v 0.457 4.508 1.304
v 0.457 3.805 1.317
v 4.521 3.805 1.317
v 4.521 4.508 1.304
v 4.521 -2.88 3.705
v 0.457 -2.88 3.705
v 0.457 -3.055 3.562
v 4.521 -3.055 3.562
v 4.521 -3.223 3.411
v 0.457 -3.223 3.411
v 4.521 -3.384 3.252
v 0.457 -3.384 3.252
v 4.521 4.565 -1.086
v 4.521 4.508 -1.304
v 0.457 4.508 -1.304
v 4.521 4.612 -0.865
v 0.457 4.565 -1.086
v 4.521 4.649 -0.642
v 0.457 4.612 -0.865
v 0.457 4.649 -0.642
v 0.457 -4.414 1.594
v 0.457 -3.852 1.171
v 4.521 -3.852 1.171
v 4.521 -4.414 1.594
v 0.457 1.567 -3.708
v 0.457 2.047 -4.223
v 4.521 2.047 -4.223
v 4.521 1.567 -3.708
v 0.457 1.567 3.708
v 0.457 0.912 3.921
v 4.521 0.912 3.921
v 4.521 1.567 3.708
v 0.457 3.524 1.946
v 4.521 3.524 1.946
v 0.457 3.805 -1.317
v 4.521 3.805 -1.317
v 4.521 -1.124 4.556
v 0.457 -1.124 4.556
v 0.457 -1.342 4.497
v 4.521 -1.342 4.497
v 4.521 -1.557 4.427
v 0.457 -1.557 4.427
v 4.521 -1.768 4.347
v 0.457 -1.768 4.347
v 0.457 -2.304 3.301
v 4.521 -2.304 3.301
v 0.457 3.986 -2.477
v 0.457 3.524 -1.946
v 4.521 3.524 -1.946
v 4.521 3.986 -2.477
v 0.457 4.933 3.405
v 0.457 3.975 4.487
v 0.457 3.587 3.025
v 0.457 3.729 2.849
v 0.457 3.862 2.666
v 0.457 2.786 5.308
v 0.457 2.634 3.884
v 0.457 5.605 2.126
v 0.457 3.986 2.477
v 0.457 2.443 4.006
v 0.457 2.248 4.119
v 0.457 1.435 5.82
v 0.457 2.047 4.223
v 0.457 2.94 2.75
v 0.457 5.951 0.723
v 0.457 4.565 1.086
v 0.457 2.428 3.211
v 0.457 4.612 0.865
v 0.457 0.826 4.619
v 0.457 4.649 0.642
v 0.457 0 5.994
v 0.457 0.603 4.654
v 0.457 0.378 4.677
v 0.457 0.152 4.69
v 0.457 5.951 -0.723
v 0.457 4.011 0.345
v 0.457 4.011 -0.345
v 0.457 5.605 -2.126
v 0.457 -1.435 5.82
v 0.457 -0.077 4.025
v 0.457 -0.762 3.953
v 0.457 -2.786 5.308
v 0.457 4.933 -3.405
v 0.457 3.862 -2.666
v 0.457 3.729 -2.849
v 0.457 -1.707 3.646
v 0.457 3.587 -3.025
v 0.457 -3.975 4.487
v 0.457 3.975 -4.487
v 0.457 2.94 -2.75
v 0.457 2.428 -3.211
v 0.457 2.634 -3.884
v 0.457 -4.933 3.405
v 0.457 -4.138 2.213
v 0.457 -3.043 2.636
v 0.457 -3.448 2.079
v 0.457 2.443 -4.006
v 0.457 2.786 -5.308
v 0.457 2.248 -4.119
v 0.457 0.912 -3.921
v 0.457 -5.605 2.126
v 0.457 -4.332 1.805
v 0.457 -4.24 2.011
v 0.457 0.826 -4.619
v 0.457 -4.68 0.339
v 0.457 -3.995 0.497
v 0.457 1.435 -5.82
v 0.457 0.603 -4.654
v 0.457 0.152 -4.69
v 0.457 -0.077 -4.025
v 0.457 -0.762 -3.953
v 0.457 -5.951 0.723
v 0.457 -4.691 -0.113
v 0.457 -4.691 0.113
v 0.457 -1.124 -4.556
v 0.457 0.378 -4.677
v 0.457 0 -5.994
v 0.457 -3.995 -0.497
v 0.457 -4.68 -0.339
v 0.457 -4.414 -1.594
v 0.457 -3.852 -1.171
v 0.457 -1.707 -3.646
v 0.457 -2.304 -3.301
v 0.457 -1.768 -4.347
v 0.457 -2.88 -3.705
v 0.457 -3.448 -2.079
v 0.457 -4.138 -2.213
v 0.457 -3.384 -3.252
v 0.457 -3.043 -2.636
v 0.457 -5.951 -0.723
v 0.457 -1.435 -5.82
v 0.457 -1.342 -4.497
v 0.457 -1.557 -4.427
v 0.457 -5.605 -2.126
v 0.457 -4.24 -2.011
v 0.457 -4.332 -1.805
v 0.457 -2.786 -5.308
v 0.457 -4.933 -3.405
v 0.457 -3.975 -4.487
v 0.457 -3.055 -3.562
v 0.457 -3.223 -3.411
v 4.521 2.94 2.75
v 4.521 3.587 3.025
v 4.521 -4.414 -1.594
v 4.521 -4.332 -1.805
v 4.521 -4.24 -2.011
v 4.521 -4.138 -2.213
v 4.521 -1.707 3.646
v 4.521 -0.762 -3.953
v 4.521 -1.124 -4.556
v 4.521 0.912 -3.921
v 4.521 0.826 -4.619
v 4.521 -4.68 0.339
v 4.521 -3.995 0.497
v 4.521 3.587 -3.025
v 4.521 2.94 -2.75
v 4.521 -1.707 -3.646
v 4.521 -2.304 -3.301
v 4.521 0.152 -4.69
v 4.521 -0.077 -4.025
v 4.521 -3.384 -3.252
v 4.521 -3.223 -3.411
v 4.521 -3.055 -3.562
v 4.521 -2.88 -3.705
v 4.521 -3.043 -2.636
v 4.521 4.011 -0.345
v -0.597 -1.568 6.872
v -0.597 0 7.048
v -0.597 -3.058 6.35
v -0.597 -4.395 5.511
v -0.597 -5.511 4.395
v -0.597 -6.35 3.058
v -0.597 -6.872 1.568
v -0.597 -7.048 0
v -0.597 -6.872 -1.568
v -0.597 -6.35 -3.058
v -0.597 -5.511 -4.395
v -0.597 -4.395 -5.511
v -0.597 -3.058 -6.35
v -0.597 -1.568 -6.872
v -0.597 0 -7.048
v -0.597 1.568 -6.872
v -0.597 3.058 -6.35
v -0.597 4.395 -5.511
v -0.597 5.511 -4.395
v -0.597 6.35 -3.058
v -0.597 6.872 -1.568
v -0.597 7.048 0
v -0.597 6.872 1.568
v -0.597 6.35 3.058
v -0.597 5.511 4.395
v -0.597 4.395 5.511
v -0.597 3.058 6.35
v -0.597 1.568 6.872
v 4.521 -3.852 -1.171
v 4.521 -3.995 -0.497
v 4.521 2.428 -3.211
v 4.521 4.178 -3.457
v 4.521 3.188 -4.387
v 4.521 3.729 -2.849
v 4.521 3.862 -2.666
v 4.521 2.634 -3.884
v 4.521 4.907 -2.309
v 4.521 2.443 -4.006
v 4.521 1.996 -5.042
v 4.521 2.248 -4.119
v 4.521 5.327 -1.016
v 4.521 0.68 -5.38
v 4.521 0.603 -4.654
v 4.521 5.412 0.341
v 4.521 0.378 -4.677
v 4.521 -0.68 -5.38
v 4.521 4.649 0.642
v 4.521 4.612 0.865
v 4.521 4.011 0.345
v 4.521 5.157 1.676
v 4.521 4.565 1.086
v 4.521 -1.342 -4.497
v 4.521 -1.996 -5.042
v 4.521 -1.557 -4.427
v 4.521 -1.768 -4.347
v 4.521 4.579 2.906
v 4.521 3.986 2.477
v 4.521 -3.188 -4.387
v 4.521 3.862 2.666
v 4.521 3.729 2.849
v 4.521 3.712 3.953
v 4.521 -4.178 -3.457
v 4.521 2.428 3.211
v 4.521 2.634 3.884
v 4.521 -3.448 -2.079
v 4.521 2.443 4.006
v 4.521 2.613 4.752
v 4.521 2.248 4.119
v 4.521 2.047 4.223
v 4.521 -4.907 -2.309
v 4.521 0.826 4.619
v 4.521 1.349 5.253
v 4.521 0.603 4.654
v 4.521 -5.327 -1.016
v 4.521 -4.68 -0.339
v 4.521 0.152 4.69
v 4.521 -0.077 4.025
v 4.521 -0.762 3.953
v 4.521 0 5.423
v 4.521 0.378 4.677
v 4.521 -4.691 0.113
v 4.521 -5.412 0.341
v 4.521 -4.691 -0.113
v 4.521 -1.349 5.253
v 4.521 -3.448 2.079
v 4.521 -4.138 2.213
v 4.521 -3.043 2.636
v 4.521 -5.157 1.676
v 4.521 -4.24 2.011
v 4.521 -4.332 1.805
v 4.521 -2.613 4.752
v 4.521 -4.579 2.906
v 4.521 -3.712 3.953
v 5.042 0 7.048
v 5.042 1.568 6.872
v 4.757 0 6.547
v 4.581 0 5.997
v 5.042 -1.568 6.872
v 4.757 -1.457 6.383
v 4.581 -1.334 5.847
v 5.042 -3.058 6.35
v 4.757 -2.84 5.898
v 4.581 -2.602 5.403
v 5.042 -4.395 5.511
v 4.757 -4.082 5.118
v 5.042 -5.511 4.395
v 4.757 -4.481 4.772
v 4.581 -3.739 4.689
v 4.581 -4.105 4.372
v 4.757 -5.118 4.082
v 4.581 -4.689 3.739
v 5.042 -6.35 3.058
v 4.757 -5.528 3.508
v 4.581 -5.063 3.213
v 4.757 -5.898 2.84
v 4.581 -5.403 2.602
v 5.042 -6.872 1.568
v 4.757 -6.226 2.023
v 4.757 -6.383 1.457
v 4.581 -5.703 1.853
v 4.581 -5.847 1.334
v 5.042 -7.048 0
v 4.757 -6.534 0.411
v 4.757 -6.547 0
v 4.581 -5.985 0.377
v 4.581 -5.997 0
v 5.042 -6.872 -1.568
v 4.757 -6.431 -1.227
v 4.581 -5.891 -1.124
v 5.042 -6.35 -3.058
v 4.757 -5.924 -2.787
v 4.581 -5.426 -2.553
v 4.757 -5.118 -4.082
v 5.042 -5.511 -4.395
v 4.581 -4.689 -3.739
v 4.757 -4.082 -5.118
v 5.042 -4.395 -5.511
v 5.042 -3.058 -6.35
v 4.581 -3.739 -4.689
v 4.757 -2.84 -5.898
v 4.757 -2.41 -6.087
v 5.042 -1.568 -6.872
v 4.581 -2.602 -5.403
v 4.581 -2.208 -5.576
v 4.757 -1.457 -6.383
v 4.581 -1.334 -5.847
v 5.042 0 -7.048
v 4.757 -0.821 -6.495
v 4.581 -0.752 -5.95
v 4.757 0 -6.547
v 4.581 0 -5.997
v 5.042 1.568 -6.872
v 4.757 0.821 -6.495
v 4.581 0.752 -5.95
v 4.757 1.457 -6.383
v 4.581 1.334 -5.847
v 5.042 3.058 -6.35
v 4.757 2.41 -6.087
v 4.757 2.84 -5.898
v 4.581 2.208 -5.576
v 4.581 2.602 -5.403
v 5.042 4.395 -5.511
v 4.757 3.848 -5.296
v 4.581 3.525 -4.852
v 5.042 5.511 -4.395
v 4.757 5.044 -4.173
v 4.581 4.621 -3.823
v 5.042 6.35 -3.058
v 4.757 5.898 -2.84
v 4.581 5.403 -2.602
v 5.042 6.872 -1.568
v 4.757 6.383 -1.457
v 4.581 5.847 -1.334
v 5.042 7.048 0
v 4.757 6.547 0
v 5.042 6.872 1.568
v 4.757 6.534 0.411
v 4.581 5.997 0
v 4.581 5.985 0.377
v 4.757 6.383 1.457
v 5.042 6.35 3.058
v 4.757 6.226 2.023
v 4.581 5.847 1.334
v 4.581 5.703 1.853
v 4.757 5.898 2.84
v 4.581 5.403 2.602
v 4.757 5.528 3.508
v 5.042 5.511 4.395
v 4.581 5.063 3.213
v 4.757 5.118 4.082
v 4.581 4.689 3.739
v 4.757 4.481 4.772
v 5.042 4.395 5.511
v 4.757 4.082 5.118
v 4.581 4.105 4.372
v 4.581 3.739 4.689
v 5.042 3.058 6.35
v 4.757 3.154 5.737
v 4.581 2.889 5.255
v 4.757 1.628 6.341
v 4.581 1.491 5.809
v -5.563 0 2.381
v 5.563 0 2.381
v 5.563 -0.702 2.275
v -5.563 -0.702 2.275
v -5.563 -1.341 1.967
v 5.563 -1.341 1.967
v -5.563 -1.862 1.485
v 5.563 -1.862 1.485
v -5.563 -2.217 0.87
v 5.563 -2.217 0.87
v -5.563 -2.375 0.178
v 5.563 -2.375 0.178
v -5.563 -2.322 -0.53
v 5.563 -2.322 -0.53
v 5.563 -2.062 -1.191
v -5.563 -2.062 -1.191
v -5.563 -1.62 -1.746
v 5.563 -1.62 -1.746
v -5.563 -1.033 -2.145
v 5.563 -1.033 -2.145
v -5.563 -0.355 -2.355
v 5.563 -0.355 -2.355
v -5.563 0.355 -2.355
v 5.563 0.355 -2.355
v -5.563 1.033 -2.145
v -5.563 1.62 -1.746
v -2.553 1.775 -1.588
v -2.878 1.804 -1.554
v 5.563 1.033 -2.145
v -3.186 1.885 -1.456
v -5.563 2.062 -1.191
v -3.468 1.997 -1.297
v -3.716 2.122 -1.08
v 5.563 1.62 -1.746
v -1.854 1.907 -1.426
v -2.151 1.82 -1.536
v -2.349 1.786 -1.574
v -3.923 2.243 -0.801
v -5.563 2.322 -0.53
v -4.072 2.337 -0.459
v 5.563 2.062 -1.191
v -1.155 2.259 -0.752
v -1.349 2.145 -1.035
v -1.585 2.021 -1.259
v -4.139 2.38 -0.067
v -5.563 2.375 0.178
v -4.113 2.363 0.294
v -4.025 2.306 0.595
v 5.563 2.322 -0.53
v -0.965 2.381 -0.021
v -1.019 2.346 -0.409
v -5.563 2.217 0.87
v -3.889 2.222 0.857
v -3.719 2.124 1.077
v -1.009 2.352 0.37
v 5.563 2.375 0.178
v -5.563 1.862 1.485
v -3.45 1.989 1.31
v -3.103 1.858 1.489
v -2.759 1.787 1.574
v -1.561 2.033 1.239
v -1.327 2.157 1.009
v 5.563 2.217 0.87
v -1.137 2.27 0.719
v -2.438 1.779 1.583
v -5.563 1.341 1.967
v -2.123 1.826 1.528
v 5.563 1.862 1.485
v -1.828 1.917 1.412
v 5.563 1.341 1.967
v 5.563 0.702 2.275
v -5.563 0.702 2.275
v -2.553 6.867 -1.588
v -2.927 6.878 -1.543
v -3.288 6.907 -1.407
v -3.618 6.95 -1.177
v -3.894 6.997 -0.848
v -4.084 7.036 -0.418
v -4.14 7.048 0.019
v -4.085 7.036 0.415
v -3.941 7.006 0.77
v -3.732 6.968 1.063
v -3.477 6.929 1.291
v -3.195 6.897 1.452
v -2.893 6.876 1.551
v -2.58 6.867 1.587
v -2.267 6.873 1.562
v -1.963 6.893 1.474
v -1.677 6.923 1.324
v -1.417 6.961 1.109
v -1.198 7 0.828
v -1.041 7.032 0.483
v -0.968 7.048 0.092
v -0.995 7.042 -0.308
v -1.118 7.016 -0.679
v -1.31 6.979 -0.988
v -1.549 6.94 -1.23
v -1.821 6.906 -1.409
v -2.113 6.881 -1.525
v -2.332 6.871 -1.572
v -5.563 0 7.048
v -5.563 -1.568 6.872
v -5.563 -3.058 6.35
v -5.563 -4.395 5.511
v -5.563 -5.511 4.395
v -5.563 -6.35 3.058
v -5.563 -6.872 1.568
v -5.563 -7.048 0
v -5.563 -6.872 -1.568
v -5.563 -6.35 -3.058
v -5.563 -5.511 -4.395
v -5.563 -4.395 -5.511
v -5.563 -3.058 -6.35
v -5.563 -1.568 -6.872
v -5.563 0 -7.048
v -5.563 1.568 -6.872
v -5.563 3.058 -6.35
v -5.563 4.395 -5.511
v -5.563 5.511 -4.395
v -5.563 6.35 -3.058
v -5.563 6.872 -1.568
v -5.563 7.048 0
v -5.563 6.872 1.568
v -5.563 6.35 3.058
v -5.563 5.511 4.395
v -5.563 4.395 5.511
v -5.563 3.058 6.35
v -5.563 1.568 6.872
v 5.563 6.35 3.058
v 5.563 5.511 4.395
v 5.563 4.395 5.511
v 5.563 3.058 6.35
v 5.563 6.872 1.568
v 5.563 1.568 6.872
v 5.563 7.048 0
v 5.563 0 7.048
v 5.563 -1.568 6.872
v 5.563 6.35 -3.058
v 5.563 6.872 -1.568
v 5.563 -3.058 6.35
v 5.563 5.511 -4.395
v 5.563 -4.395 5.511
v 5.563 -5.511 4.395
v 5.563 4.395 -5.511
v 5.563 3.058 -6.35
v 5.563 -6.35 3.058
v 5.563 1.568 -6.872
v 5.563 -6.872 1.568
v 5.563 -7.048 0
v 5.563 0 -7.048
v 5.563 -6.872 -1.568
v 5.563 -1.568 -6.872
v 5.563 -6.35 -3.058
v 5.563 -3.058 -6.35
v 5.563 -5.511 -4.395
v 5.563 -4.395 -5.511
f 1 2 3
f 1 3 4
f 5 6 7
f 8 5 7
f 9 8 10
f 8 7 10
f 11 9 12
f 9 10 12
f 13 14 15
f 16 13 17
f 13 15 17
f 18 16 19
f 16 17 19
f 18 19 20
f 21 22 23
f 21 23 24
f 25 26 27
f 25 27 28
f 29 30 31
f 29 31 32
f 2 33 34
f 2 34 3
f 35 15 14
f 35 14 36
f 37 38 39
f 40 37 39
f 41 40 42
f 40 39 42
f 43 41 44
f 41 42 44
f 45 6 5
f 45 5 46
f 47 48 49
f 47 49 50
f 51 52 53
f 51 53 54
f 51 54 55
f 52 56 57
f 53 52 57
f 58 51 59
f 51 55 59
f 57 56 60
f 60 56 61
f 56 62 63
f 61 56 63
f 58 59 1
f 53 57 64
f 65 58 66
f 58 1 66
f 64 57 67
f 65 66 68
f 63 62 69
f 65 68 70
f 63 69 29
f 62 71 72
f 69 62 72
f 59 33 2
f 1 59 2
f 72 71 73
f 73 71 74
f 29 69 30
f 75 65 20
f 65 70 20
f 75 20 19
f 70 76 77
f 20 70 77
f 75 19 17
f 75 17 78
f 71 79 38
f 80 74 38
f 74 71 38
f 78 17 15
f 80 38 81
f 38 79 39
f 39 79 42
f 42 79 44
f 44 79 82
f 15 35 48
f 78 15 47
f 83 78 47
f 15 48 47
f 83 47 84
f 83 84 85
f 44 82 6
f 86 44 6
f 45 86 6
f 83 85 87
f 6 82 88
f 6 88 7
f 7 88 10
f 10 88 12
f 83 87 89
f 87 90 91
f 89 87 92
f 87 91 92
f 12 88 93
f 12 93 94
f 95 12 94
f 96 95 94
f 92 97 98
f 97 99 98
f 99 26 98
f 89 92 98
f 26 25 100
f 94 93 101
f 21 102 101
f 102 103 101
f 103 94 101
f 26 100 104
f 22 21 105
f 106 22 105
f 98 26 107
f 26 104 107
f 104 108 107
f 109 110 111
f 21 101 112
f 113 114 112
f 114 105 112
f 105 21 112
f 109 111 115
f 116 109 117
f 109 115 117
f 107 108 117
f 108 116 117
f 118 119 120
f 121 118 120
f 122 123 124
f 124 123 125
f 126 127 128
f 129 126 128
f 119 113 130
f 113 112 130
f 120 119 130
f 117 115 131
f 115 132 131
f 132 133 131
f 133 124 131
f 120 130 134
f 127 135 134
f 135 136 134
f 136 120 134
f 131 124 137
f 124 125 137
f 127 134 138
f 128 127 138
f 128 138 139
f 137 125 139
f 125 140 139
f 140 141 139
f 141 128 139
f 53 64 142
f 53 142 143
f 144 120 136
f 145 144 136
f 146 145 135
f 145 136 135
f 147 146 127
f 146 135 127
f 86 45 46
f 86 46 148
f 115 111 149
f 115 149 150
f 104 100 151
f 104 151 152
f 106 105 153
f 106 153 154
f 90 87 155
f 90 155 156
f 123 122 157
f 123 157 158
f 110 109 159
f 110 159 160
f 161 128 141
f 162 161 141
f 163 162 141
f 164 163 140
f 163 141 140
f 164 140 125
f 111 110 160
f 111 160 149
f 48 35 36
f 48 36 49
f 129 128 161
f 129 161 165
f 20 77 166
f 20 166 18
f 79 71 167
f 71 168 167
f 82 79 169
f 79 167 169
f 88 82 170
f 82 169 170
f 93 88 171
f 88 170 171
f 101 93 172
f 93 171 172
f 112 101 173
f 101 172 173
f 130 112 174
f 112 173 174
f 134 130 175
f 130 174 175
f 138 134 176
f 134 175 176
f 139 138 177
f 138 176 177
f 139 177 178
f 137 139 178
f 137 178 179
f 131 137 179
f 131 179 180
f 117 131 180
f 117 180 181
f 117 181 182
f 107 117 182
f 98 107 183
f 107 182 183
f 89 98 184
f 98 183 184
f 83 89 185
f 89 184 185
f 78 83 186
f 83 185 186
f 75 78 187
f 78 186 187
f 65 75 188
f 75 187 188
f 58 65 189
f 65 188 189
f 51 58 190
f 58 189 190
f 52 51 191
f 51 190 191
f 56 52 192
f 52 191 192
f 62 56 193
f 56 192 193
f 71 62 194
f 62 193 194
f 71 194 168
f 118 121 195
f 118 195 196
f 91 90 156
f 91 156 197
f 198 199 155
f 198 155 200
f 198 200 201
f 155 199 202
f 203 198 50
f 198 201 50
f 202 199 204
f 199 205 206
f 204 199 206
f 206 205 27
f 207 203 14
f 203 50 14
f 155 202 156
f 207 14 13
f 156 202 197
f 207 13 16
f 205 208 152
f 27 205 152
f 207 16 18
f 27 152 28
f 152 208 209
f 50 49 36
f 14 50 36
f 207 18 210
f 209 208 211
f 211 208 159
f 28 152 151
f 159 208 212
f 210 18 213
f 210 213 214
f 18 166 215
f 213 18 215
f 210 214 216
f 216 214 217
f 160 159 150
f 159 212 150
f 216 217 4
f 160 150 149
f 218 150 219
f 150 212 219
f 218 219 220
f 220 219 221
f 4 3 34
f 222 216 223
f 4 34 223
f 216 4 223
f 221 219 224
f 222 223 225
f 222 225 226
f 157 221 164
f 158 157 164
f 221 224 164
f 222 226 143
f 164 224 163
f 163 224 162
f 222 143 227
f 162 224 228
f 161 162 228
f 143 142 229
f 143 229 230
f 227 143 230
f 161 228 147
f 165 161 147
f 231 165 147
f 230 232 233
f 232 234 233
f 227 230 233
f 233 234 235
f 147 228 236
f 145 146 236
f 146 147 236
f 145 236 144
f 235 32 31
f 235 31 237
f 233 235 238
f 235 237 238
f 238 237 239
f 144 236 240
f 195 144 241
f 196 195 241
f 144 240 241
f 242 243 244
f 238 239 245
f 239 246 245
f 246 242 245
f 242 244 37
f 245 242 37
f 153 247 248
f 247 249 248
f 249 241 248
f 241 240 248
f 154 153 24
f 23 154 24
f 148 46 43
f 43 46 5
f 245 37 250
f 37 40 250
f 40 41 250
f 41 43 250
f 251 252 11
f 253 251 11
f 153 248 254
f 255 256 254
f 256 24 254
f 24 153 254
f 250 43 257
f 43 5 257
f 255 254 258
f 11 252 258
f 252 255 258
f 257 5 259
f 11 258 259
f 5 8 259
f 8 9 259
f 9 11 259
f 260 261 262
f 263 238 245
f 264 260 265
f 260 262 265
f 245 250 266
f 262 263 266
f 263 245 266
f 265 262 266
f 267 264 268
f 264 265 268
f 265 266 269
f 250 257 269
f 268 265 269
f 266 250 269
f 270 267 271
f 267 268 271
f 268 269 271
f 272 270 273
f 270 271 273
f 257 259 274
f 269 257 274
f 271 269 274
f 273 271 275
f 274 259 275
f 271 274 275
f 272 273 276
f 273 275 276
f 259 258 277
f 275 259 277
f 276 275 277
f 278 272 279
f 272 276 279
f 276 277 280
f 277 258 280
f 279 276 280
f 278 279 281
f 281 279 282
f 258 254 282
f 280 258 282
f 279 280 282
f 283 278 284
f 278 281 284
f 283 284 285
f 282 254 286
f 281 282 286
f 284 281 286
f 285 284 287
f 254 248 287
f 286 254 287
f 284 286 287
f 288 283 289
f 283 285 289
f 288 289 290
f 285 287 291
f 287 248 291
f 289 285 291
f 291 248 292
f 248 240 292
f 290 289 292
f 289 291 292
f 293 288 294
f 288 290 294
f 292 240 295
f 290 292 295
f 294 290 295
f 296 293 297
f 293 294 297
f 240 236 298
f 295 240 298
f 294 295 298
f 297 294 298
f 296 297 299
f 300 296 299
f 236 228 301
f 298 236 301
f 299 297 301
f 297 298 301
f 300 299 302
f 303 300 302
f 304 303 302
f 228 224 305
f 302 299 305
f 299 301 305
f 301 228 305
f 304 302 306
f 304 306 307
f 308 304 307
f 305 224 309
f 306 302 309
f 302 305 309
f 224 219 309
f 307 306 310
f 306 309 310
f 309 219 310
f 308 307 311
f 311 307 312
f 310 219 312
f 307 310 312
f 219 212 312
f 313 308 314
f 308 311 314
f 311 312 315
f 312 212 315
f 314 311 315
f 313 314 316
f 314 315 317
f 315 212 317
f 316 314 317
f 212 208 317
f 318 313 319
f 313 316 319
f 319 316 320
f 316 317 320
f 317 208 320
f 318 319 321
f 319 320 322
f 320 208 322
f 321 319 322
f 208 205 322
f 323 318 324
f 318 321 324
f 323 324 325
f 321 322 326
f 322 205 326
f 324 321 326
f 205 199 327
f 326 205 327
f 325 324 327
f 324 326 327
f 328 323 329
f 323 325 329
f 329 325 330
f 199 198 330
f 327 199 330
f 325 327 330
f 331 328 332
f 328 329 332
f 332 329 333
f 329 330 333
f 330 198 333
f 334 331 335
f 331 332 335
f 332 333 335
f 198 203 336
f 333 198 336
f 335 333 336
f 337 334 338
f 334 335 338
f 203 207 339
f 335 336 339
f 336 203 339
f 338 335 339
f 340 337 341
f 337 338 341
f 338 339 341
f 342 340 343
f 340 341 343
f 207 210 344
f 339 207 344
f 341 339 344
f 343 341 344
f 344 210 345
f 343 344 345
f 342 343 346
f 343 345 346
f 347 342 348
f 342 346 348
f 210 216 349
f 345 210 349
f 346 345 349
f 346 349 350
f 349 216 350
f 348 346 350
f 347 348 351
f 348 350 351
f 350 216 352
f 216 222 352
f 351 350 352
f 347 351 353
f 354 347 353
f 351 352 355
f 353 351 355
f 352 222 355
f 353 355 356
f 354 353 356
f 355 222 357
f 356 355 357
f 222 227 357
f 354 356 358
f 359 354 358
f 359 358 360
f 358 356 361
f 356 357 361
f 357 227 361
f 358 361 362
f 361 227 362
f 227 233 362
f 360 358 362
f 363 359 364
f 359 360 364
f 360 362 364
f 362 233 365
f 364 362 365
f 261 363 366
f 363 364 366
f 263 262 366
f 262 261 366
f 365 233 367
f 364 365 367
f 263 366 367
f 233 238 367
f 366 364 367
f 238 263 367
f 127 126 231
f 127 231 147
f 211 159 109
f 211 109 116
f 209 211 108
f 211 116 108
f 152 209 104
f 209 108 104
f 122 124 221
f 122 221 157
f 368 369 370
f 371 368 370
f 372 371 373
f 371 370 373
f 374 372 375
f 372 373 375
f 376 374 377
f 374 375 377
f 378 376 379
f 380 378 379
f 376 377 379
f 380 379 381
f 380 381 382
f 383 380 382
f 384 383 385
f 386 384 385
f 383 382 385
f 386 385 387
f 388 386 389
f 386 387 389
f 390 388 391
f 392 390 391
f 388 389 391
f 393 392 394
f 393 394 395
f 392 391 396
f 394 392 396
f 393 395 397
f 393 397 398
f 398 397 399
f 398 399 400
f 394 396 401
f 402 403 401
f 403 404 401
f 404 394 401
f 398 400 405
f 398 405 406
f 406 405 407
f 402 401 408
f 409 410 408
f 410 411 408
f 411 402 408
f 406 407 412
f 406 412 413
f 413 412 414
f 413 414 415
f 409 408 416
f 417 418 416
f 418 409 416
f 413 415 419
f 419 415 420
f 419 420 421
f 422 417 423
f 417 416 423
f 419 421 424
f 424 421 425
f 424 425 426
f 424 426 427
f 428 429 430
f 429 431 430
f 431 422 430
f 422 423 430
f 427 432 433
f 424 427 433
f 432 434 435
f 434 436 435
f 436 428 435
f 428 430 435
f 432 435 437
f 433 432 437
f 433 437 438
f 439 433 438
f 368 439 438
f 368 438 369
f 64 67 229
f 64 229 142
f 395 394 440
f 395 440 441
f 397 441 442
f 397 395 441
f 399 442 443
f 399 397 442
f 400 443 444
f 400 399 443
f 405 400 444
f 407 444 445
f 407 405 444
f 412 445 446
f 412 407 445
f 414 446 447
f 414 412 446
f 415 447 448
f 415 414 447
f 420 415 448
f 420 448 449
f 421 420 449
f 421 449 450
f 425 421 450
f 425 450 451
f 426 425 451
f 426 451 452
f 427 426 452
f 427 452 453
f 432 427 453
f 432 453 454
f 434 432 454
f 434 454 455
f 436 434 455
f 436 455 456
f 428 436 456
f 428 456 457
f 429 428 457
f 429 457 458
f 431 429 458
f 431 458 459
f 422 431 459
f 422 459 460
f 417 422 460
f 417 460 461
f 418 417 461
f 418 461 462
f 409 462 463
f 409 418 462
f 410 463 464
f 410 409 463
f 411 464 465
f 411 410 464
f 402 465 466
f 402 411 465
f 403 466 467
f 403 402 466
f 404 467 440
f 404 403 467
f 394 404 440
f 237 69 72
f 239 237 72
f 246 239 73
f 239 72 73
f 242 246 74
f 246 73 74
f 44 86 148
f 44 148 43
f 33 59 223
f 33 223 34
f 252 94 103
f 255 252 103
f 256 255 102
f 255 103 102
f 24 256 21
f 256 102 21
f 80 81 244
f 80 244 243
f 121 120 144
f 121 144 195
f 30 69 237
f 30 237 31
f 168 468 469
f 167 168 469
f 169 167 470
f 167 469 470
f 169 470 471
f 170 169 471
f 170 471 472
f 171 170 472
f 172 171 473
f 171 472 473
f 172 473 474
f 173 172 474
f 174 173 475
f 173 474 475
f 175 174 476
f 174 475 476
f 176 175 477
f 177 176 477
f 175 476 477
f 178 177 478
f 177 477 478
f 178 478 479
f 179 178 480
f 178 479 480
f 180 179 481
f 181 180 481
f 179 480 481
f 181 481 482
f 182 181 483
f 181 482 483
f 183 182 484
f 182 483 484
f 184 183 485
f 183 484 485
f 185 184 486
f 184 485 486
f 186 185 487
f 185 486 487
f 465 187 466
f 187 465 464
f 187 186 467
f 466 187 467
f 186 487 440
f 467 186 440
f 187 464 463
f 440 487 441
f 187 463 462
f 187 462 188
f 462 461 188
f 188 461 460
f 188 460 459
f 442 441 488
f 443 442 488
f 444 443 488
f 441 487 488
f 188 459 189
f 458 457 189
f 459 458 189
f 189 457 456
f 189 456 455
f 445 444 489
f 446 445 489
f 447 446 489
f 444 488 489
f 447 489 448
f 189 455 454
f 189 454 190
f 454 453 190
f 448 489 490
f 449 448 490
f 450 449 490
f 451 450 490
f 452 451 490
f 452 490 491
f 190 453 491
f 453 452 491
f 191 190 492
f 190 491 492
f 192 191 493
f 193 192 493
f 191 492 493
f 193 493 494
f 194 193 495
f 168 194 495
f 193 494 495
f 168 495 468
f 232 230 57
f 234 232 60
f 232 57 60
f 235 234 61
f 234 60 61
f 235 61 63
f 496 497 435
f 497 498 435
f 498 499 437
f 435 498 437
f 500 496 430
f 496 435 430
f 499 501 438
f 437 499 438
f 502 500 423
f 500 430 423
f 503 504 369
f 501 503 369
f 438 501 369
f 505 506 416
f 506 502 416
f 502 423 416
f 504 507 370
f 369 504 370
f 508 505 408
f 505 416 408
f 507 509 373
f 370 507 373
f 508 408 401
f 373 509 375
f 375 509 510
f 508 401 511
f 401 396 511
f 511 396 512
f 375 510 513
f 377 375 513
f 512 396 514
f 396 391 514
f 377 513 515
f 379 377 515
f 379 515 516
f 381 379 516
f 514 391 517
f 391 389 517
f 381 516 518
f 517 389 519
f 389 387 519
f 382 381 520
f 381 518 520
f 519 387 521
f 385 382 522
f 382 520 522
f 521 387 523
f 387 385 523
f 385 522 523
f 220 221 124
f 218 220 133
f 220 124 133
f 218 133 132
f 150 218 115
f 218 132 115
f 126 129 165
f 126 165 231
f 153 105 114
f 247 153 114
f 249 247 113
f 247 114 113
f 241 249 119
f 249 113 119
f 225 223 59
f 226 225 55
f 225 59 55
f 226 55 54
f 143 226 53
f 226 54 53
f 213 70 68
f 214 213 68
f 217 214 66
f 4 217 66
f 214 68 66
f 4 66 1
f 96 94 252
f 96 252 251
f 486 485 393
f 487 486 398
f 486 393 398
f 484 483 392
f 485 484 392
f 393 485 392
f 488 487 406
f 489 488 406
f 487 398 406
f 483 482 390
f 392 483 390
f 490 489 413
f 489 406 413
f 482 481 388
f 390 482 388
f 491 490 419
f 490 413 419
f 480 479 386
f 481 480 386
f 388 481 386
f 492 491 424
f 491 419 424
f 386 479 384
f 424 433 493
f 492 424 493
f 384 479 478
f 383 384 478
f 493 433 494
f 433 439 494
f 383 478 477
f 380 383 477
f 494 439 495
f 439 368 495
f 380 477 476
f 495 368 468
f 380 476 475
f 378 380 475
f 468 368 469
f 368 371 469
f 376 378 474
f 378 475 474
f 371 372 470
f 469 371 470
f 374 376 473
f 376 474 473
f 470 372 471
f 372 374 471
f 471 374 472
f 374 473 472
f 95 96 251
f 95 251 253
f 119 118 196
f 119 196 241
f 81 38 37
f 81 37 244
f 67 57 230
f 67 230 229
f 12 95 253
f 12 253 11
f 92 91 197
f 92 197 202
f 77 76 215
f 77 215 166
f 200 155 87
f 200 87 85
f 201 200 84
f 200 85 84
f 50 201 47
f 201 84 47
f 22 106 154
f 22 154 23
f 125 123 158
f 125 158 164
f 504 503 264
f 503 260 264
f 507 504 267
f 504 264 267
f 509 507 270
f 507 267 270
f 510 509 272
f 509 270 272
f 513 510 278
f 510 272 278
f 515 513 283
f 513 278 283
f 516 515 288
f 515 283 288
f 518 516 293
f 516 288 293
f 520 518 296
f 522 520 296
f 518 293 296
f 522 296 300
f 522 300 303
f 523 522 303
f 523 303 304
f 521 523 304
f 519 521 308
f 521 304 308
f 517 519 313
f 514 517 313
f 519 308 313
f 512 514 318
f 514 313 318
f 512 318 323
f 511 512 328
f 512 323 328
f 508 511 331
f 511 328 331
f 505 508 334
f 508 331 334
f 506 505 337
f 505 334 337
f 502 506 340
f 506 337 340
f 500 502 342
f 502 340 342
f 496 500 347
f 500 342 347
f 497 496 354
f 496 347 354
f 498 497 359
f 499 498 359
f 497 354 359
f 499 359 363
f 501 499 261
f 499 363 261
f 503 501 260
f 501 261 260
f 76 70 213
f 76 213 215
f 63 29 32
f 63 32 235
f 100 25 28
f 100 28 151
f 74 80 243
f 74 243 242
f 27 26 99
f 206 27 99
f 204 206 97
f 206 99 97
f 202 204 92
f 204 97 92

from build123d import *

# Parameters (mm, degrees)
SKETCH4_R          = 4.8514
SKETCH4_R_2        = 4.69265
CUT_EXTRUDE2_DEPTH = 4.064
CUT_EXTRUDE1_DEPTH = 4.064
CIRPATTERN1_COUNT  = 15
SKETCH6_R          = 1.5875
CUT_EXTRUDE3_DEPTH = 12.415131329


with BuildPart() as part:
    # Sketch1 → Revolve1 (revolve)
    with BuildSketch(Plane.XY, mode=Mode.PRIVATE) as revolve1_sk:
        with BuildLine():
            Line((-5.5626, 2.38125), (5.5626, 2.38125))
            Line((5.5626, 2.38125), (5.5626, 7.0485))
            Line((5.5626, 7.0485), (5.0419, 7.0485))
            ThreePointArc((5.0419, 7.0485), (4.654552953, 6.276378742), (4.5212, 5.4229))
            Line((4.5212, 5.4229), (4.5212, 4.8514))
            Line((4.5212, 4.8514), (0.4572, 4.8514))
            Line((0.4572, 4.8514), (0.4572, 5.9944))
            Line((0.4572, 5.9944), (-0.5969, 7.0485))
            Line((-0.5969, 7.0485), (-5.5626, 7.0485))
            Line((-5.5626, 7.0485), (-5.5626, 2.38125))
        make_face()
    revolve(revolve1_sk.sketch.rotate(Axis((-5.5626, 0, 0), (1, 0, 0)), 90), axis=Axis((-5.5626, 0, 0), (1, 0, 0)))

    # Sketch4 → Cut-Extrude2 (cut)
    with BuildSketch(Plane(origin=(0.4572, 0, 0), x_dir=(0, 0, -1), z_dir=(1, 0, 0))):
        Circle(SKETCH4_R)
        Circle(SKETCH4_R_2, mode=Mode.SUBTRACT)
    extrude(amount=CUT_EXTRUDE2_DEPTH, mode=Mode.SUBTRACT)

    # Sketch3 → Cut-Extrude1 (cut)
    with BuildSketch(Plane(origin=(0.4572, 0, 0), x_dir=(0, 0, -1), z_dir=(1, 0, 0))):
        with BuildLine():
            Line((-0.641825655, 4.648550726), (-0.344589457, 4.011125642))
            Line((-0.344589457, 4.011125642), (0.344589457, 4.011125642))
            Line((0.344589457, 4.011125642), (0.641825655, 4.648550726))
            ThreePointArc((0.641825655, 4.648550726), (0, 4.69265), (-0.641825655, 4.648550726))
        make_face()
    cut_extrude1 = extrude(amount=CUT_EXTRUDE1_DEPTH, mode=Mode.SUBTRACT)

    # CirPattern1: Cut-Extrude1 ×15 about axis
    cirpattern1_axis = Axis((0, 0, 0), (1, 0, 0))
    for i in range(1, CIRPATTERN1_COUNT):
        add(cut_extrude1.rotate(cirpattern1_axis, i * 360 / CIRPATTERN1_COUNT), mode=Mode.SUBTRACT)

    # Sketch6 → Cut-Extrude3 (cut, through all)
    with BuildSketch(Plane(origin=(0, 0, 0), x_dir=(1, 0, 0), z_dir=(0, 1, 0))):
        with Locations(Location((-2.5527, 0, 0), (0, 0, 90))):
            Circle(SKETCH6_R)
    extrude(amount=CUT_EXTRUDE3_DEPTH, mode=Mode.SUBTRACT)


solid = part.part
